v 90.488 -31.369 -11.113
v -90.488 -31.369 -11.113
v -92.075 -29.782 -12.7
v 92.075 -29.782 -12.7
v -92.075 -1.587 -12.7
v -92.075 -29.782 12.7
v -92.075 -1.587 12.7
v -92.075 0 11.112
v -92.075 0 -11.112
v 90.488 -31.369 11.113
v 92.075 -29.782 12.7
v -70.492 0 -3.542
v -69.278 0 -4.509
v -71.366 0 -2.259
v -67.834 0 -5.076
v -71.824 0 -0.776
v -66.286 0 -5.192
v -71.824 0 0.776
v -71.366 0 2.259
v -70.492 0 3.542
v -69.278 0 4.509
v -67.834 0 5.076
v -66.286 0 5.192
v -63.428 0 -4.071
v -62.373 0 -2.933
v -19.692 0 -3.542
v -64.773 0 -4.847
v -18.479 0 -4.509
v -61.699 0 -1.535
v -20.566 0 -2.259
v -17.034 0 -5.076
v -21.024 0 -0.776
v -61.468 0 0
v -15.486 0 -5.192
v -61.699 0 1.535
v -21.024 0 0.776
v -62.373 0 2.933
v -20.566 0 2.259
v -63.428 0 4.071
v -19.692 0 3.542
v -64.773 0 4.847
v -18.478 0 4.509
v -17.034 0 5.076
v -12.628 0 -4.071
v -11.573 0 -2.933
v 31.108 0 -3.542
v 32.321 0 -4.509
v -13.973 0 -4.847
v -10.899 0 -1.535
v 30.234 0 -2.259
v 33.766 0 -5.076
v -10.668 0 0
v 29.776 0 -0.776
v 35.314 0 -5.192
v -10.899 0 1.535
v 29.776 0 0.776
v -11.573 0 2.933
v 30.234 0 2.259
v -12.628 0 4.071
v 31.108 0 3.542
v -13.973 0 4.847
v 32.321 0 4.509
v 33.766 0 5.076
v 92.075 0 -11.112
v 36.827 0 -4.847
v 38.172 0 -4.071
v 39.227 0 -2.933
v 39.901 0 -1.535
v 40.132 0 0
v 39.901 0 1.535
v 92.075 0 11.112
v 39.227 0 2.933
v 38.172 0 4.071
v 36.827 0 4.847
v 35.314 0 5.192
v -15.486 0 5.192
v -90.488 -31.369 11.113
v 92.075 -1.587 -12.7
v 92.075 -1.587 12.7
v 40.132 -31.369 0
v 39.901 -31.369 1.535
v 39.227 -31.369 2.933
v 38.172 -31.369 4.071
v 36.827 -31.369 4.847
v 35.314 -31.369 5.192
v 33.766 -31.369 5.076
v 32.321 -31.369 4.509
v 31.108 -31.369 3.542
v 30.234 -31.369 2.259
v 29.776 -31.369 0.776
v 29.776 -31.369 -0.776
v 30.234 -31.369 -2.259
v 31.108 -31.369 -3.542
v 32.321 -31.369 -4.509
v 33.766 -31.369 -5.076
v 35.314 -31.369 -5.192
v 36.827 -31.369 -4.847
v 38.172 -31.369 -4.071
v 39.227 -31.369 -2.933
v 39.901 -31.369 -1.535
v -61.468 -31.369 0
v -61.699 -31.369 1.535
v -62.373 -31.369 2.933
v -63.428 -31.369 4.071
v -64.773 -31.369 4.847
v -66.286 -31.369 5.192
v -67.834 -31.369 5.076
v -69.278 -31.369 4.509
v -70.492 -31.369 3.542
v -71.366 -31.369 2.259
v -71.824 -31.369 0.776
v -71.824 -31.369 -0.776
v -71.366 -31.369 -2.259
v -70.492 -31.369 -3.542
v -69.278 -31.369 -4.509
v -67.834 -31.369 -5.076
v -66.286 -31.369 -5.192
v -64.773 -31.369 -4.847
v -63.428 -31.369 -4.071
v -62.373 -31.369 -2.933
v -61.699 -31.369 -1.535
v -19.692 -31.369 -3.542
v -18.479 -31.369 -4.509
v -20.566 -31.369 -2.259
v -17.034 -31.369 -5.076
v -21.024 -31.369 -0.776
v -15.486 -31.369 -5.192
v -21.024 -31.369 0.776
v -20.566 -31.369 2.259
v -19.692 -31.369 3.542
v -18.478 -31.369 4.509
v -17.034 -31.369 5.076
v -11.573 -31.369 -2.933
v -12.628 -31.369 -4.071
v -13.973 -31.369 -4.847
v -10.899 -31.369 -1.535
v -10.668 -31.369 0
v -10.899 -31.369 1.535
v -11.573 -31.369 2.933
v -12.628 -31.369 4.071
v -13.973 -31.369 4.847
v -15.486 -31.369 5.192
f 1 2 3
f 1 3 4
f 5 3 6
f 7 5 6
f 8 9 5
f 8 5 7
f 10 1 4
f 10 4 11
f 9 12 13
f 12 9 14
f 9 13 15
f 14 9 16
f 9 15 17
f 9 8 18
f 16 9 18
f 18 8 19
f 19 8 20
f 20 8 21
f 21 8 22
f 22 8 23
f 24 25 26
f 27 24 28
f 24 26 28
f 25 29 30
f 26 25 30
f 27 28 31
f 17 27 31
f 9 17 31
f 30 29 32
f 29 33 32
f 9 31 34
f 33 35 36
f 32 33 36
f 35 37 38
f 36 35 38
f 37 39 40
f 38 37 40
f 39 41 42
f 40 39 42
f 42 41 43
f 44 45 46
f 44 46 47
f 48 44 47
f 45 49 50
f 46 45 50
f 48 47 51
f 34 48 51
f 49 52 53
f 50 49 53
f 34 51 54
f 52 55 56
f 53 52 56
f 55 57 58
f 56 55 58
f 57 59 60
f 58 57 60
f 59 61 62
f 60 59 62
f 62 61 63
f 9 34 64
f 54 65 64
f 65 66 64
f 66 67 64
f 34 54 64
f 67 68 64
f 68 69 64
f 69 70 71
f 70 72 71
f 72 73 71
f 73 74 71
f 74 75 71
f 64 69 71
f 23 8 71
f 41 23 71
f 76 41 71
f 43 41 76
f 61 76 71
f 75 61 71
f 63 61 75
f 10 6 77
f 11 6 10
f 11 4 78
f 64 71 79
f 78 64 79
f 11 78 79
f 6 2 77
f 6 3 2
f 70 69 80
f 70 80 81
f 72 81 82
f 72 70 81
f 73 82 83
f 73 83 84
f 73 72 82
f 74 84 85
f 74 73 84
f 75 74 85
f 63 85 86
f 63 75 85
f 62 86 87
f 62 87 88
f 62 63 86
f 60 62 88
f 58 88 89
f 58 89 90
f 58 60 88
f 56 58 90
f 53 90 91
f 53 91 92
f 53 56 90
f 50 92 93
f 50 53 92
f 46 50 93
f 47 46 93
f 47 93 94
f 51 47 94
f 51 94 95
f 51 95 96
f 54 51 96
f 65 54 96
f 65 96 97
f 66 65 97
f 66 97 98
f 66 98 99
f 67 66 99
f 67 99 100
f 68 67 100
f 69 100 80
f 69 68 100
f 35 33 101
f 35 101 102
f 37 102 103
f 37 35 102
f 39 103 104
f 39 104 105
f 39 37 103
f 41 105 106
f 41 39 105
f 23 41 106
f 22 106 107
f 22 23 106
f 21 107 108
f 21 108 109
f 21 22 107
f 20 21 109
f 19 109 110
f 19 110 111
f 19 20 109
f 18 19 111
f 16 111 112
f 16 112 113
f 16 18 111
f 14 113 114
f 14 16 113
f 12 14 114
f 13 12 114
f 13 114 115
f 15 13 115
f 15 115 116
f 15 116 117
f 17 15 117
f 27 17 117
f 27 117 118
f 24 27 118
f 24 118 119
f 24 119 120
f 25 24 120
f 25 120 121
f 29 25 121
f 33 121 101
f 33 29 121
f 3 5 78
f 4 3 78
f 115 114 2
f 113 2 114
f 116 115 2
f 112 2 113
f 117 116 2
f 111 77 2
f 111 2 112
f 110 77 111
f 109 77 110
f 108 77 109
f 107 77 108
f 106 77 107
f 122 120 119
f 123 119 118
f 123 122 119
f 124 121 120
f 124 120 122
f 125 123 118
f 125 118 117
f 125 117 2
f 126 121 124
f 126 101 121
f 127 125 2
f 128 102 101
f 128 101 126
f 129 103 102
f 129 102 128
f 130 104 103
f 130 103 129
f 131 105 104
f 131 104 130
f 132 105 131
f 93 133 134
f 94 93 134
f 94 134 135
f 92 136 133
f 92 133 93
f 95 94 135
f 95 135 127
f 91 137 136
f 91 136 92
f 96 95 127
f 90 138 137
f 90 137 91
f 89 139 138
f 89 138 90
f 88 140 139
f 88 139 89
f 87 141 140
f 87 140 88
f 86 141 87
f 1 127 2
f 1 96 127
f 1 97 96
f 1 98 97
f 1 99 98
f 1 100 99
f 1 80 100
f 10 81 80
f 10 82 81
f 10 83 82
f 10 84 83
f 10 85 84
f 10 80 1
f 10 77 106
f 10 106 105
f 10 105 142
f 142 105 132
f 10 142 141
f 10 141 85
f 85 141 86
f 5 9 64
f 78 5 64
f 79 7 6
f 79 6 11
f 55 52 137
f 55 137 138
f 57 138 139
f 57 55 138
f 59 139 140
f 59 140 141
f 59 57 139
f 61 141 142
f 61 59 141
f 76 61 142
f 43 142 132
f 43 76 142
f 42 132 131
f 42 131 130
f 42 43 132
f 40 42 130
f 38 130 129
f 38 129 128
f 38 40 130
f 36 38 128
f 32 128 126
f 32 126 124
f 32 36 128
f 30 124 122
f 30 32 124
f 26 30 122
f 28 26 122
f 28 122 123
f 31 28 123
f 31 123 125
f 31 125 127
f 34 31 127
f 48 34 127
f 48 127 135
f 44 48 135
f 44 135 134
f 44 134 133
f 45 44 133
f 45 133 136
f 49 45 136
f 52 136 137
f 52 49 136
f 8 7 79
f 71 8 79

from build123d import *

# Parameters (mm, degrees)
F0_W     = 184.15
F0_H     = 25.4
F0_R     = 5.207
F1_DEPTH = 31.369
F2_SIZE  = 1.5875
F3_SIZE  = 1.5875
F4_SIZE  = 1.5875


with BuildPart() as f1:
    # F0 (on Front) → F1 (new body)
    with BuildSketch(Plane.XZ):
        Rectangle(F0_W, F0_H)
        with Locations((-66.675, 0)):
            Circle(F0_R, mode=Mode.SUBTRACT)
        with Locations((-15.875, 0)):
            Circle(F0_R, mode=Mode.SUBTRACT)
        with Locations((34.925, 0)):
            Circle(F0_R, mode=Mode.SUBTRACT)
    extrude(amount=F1_DEPTH)

    # F2
    f2_edges = [f1.edges().sort_by_distance(p)[0] for p in [
        (92.075, -31.369, 0),
    ]]
    chamfer(f2_edges, length=F2_SIZE)

    # F3
    f3_edges = [f1.edges().sort_by_distance(p)[0] for p in [
        (-92.075, -31.369, 0),
    ]]
    chamfer(f3_edges, length=F3_SIZE)

    # F4
    f4_edges = [f1.edges().sort_by_distance(p)[0] for p in [
        (0, -31.369, 12.7),
        (0, -31.369, -12.7),
        (0, 0, -12.7),
        (0, 0, 12.7),
    ]]
    chamfer(f4_edges, length=F4_SIZE)


solid = f1.part
